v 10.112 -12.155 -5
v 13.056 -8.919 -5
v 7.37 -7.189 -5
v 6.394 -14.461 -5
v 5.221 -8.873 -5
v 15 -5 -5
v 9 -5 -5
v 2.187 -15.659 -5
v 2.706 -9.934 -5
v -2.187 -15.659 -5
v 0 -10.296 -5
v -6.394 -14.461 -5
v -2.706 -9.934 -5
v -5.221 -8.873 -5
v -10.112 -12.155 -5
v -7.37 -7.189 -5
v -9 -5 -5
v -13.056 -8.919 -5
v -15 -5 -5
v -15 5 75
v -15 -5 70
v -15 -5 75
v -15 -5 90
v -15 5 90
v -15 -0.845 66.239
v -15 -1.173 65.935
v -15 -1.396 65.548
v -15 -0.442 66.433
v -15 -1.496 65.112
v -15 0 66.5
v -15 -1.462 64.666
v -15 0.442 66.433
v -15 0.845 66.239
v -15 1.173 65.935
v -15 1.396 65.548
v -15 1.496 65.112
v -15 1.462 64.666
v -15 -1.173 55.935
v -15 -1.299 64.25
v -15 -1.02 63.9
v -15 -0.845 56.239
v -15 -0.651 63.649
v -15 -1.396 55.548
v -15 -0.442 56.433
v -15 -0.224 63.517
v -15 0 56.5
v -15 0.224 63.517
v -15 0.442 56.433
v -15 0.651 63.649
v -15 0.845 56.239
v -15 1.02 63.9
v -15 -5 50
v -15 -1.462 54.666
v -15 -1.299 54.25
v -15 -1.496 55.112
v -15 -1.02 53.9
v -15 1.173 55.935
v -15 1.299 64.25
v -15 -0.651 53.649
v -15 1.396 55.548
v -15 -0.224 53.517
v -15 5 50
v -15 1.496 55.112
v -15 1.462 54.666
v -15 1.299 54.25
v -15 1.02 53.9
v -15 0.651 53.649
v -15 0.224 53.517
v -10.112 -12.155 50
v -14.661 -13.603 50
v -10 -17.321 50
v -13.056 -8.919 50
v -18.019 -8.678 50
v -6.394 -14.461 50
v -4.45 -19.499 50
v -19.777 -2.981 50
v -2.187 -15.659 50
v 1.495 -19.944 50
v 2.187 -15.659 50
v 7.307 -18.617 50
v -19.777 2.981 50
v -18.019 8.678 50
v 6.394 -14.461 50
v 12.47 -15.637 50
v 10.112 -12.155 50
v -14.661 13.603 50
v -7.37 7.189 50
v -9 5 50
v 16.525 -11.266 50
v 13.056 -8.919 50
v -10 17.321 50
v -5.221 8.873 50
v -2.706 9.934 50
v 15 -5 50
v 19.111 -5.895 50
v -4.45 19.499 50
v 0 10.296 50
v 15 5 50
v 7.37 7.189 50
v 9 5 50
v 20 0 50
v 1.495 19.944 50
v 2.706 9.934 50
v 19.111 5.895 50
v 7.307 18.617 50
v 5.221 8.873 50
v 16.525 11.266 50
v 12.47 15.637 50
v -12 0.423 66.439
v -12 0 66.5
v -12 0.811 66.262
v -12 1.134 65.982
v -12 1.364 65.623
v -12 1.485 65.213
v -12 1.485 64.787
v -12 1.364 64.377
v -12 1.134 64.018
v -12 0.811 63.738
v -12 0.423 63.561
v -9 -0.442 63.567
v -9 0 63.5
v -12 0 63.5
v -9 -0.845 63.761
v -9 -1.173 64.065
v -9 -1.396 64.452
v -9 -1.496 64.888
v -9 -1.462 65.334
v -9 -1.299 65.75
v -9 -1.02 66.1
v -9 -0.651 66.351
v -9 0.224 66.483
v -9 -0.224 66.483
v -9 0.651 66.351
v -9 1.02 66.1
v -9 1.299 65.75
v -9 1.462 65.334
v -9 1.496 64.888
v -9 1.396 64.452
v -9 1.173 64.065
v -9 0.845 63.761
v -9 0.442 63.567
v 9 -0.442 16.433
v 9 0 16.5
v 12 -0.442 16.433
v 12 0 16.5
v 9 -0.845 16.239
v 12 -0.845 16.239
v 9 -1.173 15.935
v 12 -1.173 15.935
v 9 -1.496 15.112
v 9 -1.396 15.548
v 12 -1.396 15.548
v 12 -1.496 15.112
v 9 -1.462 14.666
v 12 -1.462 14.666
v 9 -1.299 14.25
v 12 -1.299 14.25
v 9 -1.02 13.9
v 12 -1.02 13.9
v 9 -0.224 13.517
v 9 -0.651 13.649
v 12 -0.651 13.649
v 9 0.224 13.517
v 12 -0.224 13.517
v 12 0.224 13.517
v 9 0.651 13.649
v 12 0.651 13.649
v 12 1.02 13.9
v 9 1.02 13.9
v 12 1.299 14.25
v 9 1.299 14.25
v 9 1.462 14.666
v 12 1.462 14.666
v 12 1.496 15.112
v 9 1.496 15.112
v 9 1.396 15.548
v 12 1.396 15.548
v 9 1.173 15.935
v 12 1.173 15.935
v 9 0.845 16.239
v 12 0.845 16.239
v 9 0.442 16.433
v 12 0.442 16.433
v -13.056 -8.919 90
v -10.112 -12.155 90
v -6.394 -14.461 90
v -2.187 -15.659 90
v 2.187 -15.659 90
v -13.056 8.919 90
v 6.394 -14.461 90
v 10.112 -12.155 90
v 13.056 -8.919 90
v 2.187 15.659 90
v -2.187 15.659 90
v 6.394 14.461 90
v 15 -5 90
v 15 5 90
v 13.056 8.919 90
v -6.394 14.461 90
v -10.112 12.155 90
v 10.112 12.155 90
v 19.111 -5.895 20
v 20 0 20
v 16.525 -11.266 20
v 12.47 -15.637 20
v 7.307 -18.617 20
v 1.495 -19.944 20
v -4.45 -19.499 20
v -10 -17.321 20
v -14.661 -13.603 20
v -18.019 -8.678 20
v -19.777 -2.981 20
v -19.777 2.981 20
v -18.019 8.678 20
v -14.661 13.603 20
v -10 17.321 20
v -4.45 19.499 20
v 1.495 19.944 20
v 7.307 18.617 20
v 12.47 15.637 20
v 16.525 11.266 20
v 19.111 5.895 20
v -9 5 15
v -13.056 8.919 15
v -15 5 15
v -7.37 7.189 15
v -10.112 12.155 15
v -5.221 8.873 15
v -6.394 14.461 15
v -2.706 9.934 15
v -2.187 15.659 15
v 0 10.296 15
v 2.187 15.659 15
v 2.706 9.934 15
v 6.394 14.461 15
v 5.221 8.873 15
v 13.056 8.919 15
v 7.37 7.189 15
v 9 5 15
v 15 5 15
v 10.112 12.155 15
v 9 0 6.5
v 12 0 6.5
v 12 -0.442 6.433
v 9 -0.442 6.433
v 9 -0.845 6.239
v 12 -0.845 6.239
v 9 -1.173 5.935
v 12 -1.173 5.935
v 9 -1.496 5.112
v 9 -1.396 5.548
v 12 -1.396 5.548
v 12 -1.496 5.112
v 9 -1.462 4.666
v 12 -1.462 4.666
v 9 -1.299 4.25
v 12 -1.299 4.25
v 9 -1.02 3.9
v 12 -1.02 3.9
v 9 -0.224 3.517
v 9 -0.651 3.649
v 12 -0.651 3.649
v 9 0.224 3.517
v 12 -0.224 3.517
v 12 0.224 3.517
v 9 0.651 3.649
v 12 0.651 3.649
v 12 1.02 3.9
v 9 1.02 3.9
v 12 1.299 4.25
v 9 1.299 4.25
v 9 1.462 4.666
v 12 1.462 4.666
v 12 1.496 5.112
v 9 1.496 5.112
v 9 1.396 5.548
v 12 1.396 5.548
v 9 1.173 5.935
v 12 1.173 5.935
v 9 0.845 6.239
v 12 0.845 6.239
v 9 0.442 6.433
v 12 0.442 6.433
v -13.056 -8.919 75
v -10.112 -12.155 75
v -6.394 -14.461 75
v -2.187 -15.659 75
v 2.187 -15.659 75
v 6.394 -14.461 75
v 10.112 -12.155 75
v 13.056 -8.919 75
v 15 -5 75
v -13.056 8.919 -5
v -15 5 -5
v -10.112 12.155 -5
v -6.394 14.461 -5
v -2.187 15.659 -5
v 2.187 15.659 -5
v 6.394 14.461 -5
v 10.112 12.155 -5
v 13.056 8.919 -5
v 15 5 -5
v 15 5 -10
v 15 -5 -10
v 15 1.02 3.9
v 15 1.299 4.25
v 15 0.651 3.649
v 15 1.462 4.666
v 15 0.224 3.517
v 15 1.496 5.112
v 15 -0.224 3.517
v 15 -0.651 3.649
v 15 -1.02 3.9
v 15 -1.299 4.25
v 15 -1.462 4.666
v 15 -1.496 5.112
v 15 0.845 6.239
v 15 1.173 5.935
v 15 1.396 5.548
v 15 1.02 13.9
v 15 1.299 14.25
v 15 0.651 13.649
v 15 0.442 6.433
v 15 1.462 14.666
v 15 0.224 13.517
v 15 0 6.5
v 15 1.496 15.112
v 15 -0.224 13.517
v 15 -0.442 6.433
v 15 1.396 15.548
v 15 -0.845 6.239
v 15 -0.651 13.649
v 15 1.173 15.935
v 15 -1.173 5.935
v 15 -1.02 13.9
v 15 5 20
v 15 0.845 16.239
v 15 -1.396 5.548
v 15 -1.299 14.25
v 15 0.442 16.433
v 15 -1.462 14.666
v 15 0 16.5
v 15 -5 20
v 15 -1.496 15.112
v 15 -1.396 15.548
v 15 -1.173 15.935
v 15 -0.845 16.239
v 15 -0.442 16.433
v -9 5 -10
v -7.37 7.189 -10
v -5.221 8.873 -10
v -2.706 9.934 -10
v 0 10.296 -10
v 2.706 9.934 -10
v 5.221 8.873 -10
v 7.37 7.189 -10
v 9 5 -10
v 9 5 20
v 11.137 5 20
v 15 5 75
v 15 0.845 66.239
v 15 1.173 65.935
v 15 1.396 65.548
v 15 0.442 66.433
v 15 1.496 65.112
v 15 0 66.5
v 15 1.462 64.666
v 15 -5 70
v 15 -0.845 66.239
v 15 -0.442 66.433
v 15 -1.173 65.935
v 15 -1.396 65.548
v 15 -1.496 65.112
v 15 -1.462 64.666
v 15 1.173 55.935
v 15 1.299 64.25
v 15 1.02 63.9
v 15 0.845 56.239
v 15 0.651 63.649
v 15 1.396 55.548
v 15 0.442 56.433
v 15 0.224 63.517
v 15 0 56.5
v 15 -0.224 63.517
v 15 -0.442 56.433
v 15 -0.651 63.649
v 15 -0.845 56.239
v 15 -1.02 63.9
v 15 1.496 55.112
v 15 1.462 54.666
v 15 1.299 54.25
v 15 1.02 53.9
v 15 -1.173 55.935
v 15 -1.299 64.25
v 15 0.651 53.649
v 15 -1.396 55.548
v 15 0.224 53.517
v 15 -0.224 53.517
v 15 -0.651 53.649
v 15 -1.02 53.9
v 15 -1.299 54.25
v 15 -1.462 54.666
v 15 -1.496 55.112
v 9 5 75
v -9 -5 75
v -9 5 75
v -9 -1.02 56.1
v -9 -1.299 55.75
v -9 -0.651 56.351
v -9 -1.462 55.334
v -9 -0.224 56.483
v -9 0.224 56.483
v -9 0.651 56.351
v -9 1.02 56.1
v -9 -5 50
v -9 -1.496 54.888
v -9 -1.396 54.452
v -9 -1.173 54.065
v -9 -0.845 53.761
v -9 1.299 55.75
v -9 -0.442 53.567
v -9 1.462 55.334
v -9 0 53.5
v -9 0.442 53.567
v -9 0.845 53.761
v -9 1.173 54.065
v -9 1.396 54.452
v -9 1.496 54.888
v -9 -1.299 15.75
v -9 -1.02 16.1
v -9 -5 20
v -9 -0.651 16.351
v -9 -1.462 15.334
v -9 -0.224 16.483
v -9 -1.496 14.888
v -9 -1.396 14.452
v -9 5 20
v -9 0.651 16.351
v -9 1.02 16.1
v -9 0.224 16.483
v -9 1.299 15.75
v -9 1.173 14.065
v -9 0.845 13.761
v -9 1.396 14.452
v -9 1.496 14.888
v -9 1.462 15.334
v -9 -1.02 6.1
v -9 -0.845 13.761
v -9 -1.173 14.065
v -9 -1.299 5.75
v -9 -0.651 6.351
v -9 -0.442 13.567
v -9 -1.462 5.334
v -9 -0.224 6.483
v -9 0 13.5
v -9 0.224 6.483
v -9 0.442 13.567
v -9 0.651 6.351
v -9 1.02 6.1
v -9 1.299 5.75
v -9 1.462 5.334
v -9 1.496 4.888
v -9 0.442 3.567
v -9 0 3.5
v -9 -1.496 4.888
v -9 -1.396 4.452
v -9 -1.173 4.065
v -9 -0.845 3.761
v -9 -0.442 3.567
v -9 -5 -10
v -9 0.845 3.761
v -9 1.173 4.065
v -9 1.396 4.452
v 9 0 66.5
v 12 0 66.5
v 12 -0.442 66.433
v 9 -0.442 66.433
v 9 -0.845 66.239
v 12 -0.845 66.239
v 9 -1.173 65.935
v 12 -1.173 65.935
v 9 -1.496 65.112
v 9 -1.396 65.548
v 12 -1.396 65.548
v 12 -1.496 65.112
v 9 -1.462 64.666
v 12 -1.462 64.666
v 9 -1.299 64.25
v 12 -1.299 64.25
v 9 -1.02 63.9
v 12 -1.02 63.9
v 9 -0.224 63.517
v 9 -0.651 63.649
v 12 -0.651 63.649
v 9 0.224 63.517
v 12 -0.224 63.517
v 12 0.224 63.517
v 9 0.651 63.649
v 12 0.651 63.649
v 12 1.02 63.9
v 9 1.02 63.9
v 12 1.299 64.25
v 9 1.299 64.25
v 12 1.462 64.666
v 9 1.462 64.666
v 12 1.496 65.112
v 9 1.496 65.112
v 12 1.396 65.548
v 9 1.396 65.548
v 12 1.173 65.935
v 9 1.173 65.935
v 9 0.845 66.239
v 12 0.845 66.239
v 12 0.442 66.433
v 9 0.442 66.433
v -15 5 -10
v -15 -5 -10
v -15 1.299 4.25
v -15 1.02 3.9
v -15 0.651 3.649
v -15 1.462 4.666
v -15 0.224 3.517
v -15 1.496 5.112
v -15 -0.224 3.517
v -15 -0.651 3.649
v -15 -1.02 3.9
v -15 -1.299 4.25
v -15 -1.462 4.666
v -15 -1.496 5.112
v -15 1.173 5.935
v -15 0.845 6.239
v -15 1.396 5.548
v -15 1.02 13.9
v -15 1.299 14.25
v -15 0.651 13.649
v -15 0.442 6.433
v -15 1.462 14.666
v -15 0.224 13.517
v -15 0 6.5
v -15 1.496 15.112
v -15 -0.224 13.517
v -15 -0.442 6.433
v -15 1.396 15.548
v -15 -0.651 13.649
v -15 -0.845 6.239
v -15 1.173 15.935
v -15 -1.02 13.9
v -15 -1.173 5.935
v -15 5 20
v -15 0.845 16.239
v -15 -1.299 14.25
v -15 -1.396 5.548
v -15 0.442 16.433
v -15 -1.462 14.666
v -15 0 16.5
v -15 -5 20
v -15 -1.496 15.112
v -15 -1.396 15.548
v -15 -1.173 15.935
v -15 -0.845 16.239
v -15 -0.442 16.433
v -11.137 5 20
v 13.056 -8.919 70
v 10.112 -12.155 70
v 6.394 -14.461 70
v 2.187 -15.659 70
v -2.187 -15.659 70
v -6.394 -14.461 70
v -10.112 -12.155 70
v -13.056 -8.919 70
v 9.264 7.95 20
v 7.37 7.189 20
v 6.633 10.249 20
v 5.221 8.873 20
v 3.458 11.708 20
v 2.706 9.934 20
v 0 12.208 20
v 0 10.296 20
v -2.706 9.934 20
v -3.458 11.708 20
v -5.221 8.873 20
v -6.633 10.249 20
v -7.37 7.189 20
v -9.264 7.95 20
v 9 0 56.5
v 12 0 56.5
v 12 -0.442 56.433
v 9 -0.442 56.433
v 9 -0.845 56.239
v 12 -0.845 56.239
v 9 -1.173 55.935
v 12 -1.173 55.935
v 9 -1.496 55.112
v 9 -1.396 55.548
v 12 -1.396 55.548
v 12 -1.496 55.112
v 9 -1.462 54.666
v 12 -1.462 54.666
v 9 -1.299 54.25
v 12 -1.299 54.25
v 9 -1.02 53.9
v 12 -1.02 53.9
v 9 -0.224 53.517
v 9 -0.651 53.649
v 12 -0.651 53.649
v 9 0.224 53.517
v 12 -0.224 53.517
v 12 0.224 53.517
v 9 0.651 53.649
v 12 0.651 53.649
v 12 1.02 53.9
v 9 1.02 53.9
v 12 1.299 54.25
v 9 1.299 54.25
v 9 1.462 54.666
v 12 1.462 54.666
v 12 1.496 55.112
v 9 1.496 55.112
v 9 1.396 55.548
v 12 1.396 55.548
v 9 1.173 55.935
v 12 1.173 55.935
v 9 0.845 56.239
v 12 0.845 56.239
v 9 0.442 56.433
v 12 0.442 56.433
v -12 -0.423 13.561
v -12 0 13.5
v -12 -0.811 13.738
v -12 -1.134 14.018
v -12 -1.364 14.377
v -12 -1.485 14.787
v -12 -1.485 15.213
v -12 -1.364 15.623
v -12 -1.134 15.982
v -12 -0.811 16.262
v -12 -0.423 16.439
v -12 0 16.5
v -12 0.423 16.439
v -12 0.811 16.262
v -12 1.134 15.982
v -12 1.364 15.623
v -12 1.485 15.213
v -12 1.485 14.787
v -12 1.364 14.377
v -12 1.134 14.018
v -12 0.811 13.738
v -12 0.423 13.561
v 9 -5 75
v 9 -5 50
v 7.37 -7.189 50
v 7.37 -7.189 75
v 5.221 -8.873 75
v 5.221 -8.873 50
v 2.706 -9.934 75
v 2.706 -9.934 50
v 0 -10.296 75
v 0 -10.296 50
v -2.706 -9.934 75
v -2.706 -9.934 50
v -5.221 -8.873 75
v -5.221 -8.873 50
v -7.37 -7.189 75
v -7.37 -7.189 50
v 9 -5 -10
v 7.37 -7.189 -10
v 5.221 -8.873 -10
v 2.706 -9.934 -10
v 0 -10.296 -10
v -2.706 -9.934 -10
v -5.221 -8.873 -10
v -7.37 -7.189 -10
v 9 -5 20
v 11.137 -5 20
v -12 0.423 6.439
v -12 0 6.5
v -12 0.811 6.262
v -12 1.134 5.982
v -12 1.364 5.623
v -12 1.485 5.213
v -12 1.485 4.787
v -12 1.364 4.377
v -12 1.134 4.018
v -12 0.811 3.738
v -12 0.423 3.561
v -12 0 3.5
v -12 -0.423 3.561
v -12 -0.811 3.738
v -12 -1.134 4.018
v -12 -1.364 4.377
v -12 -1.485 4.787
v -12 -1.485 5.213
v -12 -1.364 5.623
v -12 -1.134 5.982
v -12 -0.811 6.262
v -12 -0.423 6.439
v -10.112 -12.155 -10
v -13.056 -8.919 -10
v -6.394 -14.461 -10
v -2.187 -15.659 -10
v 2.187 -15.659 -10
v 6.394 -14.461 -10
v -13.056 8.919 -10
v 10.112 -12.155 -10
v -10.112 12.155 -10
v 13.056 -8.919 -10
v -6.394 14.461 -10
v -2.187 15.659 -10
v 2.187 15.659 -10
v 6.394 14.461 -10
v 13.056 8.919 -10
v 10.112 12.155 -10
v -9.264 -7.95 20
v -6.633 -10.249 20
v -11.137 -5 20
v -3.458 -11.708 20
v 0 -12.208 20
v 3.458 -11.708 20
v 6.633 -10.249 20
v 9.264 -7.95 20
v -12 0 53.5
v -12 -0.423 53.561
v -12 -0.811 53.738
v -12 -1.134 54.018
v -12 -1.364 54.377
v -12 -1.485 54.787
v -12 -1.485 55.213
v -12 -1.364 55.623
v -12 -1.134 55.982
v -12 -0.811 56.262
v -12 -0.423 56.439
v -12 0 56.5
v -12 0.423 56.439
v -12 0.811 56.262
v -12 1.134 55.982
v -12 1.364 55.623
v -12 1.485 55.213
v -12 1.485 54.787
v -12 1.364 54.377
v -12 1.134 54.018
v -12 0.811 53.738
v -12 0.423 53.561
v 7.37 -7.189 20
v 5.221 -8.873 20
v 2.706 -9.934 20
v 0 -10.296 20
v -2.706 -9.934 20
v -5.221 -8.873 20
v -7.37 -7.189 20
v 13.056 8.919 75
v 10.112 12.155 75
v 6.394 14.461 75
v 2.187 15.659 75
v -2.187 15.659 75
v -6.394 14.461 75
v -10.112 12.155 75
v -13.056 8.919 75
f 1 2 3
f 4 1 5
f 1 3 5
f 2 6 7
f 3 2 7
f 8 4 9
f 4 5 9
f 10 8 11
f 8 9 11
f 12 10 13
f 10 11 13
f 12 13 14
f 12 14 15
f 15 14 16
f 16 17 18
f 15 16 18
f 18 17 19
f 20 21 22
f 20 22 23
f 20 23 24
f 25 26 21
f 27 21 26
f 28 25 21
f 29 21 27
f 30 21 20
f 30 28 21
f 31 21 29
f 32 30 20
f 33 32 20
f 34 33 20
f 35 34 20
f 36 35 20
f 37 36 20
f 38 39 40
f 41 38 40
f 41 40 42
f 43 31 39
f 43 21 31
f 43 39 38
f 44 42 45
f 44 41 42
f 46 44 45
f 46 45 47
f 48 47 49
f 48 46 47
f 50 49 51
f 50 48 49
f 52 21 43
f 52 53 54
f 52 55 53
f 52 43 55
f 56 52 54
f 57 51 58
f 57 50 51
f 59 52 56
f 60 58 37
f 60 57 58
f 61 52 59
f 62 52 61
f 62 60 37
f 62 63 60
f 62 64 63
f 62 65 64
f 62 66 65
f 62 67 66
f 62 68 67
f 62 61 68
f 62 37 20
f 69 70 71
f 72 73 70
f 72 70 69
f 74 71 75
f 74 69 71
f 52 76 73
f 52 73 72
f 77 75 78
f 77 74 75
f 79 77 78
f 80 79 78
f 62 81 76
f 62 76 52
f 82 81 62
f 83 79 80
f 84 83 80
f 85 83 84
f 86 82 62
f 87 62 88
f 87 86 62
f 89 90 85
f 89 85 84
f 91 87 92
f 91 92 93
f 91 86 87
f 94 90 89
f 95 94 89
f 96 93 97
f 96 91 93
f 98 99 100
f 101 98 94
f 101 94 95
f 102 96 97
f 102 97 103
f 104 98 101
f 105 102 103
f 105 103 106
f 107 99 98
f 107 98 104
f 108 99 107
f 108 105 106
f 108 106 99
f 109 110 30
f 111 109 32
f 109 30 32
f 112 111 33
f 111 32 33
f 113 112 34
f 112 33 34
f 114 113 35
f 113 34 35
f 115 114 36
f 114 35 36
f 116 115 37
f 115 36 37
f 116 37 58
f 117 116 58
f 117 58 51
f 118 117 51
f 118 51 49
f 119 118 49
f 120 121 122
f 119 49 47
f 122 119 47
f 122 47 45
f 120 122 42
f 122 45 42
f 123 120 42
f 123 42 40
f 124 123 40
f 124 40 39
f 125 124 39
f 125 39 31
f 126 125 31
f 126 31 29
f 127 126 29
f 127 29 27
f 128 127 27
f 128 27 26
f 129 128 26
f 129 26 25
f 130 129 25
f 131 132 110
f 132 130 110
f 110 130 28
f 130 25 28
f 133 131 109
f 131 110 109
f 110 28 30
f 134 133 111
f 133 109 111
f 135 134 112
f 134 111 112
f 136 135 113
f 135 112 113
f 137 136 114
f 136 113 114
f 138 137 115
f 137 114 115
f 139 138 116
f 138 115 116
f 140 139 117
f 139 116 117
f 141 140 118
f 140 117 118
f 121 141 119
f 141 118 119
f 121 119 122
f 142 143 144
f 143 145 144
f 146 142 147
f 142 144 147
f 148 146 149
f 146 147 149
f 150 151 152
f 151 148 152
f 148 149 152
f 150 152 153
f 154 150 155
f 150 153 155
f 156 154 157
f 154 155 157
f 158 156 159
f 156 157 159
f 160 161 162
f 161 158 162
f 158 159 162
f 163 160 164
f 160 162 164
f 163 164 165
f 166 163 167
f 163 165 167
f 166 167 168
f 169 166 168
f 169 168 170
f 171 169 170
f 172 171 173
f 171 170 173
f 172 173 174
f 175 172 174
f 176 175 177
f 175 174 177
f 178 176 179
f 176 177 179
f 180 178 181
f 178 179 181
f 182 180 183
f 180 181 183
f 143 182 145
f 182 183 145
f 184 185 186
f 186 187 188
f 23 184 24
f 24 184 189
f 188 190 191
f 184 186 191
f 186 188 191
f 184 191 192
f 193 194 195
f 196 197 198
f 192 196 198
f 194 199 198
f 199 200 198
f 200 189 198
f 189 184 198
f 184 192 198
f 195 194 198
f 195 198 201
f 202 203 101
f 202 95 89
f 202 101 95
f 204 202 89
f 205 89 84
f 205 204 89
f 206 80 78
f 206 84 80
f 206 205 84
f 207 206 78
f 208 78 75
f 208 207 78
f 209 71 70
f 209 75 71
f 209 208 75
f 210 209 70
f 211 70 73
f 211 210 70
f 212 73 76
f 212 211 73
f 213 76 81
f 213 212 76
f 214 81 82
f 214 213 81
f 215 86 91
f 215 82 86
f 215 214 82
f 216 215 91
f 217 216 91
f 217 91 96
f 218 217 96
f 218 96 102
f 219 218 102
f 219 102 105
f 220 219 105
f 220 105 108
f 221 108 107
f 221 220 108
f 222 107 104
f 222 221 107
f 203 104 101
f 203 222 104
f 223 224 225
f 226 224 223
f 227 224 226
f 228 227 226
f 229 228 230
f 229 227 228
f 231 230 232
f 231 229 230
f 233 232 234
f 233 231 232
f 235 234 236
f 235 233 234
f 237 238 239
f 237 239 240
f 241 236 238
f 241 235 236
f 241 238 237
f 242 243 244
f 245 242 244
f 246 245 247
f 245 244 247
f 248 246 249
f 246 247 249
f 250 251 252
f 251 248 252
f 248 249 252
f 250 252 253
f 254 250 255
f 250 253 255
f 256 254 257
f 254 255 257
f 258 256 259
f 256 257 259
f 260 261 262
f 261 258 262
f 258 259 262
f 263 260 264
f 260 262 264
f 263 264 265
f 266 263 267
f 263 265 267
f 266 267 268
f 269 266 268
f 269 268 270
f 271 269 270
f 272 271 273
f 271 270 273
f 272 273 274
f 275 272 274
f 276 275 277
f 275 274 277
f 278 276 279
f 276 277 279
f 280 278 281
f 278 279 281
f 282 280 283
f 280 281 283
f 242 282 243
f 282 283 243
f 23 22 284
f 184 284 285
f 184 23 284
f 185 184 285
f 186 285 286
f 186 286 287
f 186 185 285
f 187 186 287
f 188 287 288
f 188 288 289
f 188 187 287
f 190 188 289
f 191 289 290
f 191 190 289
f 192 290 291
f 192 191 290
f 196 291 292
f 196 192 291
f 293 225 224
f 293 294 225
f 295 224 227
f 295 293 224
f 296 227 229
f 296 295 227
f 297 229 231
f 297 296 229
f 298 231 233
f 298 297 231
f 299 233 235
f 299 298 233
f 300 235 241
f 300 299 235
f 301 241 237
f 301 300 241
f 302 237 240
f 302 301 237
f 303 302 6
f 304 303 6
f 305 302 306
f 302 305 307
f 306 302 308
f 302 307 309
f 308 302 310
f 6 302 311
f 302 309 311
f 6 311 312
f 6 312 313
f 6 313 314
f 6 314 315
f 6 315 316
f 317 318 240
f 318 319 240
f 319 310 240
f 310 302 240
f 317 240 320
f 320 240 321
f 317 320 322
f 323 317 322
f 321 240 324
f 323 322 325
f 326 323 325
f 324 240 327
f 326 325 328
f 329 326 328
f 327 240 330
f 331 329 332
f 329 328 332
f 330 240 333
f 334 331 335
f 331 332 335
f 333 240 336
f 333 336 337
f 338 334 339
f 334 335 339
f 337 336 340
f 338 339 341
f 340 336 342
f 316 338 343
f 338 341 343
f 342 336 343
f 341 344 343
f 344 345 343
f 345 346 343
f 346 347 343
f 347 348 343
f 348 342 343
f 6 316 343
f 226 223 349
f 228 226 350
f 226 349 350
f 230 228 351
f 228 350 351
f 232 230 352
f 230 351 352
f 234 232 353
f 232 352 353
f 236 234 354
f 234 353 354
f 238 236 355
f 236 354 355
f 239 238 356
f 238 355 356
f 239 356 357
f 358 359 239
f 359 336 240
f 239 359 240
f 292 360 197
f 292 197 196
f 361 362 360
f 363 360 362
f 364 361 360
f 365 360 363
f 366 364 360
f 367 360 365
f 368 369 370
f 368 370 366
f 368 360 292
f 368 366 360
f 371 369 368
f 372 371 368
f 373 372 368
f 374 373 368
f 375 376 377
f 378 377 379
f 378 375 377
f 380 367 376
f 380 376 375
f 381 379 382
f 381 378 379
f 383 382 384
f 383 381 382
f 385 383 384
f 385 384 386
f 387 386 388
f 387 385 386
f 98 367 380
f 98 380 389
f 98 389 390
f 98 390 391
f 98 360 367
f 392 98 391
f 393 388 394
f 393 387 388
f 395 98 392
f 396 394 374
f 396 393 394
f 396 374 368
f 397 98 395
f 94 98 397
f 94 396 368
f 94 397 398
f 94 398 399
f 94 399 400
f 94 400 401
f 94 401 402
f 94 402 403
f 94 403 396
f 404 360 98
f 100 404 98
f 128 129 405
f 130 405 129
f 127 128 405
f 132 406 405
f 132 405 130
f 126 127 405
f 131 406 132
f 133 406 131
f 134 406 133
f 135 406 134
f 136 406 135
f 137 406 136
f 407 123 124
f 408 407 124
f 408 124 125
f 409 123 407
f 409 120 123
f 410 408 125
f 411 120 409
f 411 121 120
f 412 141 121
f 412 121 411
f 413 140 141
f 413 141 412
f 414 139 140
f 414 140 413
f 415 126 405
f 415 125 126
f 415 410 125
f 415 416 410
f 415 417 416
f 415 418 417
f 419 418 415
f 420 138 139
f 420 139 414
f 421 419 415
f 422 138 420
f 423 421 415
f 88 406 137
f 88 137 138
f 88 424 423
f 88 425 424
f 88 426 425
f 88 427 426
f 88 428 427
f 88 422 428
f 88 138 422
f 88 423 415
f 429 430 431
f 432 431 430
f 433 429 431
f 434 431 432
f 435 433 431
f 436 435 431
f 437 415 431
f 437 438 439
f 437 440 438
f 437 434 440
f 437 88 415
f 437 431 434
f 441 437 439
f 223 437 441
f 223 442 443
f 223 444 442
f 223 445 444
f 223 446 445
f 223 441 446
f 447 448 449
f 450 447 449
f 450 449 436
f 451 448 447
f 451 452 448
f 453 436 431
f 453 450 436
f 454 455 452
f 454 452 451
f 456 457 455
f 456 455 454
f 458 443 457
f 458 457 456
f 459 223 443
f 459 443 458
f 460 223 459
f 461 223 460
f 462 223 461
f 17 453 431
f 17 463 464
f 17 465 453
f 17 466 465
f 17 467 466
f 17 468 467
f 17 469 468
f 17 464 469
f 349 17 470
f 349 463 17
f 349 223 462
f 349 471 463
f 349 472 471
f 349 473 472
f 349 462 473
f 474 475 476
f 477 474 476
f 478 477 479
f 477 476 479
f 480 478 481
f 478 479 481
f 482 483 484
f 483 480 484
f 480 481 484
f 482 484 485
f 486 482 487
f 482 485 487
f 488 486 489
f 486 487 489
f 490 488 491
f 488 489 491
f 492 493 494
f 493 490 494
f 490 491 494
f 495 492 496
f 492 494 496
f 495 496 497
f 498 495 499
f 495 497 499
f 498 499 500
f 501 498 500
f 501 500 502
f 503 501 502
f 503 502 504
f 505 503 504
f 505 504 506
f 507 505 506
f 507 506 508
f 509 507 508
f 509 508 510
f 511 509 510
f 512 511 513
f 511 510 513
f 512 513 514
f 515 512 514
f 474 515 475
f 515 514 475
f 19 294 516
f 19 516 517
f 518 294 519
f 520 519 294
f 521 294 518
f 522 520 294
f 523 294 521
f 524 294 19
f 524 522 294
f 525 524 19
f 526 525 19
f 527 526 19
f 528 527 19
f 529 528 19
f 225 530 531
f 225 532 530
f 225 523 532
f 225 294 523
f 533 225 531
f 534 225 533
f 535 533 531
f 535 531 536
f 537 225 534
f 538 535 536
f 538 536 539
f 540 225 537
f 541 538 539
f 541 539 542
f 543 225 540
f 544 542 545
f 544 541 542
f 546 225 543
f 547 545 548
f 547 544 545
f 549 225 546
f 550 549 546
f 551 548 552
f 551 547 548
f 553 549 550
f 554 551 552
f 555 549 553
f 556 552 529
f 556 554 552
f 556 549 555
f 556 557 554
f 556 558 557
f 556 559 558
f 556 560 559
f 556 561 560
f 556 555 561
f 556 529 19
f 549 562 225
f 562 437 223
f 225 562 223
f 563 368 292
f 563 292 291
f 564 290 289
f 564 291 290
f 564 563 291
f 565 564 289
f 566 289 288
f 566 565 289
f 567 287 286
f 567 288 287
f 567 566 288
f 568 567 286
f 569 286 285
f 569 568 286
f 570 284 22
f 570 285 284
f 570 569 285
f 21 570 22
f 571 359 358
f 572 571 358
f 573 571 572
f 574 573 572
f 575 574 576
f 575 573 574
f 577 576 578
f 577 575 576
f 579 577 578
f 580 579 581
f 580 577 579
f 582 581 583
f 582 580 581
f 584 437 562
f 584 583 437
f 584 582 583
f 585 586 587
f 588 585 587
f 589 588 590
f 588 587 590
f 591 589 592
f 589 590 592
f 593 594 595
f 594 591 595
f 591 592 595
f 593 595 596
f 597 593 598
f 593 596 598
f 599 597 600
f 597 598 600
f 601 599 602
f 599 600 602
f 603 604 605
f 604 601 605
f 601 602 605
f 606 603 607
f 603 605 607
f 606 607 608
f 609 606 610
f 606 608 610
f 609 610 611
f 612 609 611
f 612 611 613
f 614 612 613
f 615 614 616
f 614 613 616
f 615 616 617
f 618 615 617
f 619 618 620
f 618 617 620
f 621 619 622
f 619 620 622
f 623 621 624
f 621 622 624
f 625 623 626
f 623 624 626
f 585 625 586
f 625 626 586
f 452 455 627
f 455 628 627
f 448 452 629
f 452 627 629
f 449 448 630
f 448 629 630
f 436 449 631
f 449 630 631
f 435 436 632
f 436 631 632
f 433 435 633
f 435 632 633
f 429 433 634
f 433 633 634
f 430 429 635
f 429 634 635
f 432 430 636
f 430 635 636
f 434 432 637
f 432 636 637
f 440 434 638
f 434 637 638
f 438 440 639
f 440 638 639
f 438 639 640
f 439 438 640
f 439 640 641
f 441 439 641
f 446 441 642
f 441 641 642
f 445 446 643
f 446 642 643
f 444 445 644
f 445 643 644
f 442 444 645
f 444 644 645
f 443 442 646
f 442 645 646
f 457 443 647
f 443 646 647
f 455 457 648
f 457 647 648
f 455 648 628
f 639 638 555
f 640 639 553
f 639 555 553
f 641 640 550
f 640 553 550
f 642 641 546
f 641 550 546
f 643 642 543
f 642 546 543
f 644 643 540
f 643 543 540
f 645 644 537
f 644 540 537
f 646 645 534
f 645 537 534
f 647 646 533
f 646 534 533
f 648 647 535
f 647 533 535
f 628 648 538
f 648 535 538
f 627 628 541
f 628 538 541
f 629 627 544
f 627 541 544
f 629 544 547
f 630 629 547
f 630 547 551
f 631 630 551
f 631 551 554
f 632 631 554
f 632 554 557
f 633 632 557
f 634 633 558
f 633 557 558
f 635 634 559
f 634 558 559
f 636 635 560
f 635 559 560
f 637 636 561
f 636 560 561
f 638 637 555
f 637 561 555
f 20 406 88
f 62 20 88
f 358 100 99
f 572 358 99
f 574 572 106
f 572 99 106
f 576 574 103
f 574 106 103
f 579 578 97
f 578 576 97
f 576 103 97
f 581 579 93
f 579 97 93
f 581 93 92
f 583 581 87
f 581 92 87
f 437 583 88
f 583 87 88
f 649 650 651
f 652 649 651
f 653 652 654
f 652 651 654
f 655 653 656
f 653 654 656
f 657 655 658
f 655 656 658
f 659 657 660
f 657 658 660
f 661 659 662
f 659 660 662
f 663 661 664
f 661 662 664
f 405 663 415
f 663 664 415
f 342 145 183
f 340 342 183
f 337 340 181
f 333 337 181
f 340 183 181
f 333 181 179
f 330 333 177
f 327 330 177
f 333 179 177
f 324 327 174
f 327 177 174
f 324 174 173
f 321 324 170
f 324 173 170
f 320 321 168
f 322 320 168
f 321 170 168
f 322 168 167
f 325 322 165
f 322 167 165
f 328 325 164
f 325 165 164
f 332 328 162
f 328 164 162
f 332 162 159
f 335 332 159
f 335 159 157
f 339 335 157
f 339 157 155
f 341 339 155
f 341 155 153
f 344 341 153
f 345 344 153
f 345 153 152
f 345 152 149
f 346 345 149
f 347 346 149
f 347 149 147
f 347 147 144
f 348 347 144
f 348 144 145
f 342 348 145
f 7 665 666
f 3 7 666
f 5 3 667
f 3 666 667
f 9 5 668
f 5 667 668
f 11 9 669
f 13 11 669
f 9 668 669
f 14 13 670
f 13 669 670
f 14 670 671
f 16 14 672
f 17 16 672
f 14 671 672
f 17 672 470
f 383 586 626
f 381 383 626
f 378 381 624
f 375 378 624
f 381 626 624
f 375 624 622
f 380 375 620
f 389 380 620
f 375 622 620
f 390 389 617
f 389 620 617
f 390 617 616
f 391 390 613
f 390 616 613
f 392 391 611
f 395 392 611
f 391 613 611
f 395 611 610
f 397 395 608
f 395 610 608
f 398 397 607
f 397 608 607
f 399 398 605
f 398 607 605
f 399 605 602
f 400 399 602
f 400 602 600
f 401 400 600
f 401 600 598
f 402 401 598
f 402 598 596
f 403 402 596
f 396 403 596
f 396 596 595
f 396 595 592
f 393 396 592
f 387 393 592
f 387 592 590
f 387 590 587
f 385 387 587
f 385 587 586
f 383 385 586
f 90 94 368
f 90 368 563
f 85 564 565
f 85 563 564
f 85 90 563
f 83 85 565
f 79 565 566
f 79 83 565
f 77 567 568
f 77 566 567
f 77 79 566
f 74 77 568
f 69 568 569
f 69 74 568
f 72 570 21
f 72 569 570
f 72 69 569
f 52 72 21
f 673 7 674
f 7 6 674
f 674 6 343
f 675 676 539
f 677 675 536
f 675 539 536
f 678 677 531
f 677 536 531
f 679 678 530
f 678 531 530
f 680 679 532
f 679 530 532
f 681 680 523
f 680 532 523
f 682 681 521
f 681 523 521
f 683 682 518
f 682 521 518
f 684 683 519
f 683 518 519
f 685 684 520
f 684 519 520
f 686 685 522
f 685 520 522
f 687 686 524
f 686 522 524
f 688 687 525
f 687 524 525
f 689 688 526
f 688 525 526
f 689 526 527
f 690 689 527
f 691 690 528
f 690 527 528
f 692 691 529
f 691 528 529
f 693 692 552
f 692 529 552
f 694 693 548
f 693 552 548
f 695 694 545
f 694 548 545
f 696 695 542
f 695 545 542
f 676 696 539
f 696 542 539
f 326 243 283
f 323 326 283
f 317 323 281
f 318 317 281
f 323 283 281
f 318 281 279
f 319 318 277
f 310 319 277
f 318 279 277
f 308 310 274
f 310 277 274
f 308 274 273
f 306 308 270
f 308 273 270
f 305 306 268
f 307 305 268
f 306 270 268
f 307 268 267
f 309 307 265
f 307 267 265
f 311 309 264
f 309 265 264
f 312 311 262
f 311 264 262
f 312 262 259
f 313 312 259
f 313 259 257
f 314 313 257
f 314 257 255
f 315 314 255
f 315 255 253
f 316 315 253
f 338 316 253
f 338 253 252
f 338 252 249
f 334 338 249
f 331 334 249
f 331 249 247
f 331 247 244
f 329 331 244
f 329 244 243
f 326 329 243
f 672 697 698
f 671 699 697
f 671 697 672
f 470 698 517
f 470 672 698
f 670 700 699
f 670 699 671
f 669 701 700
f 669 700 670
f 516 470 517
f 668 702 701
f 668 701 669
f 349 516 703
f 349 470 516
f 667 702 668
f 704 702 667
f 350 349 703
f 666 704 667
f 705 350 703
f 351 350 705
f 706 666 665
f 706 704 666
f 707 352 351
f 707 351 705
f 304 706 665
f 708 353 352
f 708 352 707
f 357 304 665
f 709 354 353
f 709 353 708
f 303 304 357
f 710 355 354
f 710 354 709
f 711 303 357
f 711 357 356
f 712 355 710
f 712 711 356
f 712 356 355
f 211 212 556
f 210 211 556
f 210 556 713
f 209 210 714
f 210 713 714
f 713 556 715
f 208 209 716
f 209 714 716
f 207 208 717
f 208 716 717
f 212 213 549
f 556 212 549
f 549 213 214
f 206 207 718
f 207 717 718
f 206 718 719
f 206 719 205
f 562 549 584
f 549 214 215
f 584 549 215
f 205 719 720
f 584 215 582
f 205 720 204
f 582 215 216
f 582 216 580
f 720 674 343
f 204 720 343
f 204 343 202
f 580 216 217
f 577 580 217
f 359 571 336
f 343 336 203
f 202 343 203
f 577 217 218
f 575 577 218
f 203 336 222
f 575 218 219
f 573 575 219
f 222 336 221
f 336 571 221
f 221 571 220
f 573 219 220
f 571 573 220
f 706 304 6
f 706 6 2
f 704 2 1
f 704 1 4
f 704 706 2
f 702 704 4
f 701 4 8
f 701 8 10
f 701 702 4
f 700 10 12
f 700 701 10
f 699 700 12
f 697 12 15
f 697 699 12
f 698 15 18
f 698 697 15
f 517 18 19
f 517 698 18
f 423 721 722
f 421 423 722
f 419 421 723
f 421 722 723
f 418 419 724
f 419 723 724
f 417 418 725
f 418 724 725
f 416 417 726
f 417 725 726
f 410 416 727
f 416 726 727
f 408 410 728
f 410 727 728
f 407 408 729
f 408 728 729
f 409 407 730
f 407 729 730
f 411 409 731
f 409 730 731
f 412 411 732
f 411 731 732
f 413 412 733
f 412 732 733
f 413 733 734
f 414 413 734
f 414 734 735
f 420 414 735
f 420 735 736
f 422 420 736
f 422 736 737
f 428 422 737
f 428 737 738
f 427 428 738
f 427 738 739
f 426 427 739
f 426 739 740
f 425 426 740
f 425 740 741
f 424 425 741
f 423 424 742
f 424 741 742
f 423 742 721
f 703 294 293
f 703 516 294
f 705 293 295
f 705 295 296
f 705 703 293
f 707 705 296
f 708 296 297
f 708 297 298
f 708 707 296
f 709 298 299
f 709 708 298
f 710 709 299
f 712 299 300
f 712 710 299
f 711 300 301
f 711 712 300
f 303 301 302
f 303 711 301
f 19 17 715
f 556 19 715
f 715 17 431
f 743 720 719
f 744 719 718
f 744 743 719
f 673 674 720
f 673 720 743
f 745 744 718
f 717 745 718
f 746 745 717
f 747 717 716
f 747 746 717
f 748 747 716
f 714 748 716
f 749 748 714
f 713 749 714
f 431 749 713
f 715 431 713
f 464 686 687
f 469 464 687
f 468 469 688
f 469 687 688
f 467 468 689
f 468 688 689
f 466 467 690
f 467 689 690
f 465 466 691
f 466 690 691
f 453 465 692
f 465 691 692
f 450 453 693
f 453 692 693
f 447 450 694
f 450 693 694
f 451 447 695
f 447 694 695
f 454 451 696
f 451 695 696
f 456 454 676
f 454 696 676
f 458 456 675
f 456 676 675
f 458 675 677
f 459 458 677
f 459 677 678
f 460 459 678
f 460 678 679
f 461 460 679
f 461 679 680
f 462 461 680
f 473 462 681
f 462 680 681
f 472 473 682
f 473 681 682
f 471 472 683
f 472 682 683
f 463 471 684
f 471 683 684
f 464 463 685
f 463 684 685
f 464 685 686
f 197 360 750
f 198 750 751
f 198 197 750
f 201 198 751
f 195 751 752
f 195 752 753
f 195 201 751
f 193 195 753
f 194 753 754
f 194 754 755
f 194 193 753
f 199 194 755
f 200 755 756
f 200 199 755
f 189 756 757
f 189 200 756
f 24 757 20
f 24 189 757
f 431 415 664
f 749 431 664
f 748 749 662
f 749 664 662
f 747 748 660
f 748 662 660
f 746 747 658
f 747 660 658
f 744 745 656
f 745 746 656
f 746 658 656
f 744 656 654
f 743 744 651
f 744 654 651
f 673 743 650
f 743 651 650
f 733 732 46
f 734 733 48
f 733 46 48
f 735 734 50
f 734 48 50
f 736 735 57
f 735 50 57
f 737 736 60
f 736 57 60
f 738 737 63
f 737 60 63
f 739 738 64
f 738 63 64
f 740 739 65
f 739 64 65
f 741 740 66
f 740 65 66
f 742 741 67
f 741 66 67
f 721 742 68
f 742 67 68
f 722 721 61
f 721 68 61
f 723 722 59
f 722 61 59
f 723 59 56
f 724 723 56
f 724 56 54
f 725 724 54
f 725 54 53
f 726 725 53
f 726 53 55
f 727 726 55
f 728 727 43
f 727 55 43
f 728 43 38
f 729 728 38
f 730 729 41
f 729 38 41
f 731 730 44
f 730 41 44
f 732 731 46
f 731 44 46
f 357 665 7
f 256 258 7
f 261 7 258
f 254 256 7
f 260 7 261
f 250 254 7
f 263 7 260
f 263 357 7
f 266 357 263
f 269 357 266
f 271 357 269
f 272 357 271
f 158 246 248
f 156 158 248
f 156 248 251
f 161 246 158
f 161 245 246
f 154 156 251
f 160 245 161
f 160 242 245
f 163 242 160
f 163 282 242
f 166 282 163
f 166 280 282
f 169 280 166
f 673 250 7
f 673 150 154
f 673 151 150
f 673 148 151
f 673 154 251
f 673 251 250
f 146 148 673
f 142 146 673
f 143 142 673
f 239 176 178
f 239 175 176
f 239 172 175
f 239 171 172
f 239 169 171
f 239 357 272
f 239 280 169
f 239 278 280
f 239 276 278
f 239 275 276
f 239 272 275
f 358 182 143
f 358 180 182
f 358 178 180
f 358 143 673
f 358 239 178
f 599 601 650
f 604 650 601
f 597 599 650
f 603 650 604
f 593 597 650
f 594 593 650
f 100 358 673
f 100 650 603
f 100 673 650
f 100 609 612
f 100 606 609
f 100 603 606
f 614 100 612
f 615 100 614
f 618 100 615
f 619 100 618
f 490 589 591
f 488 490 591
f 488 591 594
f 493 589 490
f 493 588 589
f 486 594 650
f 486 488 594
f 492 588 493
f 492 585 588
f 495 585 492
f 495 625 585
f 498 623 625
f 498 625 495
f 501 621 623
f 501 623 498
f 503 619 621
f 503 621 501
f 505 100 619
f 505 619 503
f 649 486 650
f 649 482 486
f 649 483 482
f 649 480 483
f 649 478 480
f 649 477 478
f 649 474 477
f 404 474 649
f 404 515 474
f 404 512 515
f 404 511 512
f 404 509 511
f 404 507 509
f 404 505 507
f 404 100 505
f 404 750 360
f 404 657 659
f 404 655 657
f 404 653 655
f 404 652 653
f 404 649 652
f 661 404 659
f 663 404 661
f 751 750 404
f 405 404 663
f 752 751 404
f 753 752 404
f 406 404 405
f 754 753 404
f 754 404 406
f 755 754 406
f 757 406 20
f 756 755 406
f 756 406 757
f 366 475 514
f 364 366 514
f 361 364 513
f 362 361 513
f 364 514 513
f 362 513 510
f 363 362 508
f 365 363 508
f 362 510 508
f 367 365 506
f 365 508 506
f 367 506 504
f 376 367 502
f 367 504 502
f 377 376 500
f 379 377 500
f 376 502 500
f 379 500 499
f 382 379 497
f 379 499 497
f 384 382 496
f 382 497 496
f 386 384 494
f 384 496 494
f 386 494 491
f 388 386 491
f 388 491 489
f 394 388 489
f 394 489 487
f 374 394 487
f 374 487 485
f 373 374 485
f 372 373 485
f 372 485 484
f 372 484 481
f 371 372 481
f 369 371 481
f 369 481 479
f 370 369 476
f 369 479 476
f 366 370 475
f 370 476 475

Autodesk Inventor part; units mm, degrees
ref_plane "YZ Plane" through (0, 0, 0) normal (1, 0, 0) x (0, 1, 0)
ref_plane "XZ Plane" through (0, 0, 0) normal (0, 1, 0) x (-1, 0, 0)
ref_plane "XY Plane" through (0, 0, 0) normal (0, 0, 1) x (1, 0, 0)
ref_plane "Work Plane2" through (0, 0, 20) normal (0, 0, 1) x (1, 0, 0)
sketch "Sketch3" plane through (0, 0, 20) normal (0, 0, 1) x (1, 0, 0)
  line L0 (-11.1369, 5) -> (-11.1369, -5)
  line L1 (-11.1369, 5) -> (-14.9999, 5)
  line L2 (-14.9999, 5) -> (-14.9999, -5)
  line L3 (-14.9999, -5) -> (-11.1369, -5)
  line L4 (-11.1369, -5) -> (-11.1369, 5)
  line L5 (11.1369, 5) -> (14.9999, 5)
  line L6 (14.9999, 5) -> (14.9999, -5)
  line L7 (14.9999, -5) -> (11.1369, -5)
  line L8 (11.1369, -5) -> (11.1369, 5)
  point P0 (0, 0)
  point P1 (0, 0)
  dimension "d9" = 3.863
  dimension "d10" = 3.863
extrude "Extrusion3" add sketch "Sketch3" against normal blind 30
sketch "Sketch4" plane through (-14.9999, -5, 20) normal (-1, 0, 0) x (0, 0, 1)
  line L0 (0, 5) -> (0, 0)
  circle A0 centre (-15, 5) radius 1.5
  circle A1 centre (-5, 5) radius 1.5
  point P0 (-20, 5)
  dimension "d13" = 5
  dimension "d14" = 5
  dimension "d17" = 3
  dimension "d18" = 3
extrude "Extrusion4" cut sketch "Sketch4" against normal blind 200
sketch "Sketch5" plane through (0, 0, 20) normal (0, 0, 1) x (1, 0, 0)
  circle A0 centre (0, 0) radius 20
  circle A1 centre (0, 0) radius 12.2078
  point P0 (-14.9999, 5)
  point P1 (-11.1369, -5)
  point P2 (11.1369, -5)
  point P3 (14.9999, 5)
  dimension "d21" = 40
extrude "Extrusion5" add sketch "Sketch5" along normal blind 30
sketch "Sketch6" plane through (0, 0, 20) normal (0, 0, 1) x (1, 0, 0)
  line L0 (-14.9999, -5) -> (-11.1369, -5) projected
  line L1 (-14.9999, 5) -> (-11.1369, 5) projected
  line L2 (-11.1369, -5) -> (-13.4979, -5)
  line L3 (-13.4979, -5) -> (-13.4979, 5)
  line L4 (-13.4979, 5) -> (-11.1369, 5)
  line L5 (-11.1369, 5) -> (-11.1369, -5)
  line L6 (11.1369, -5) -> (11.1369, 5) projected
  line L7 (11.1369, -5) -> (13.9529, -5)
  line L8 (13.9529, -5) -> (13.9529, 5)
  line L9 (13.9529, 5) -> (11.1369, 5)
  line L10 (11.1369, 5) -> (11.1369, -5)
  arc A0 (11.1369, 5) -> (-11.1369, 5) centre (0, 0) ccw projected
  arc A1 (-11.1369, -5) -> (11.1369, -5) centre (0, 0) ccw projected
  arc A2 (-11.1369, 5) -> (-11.1369, -5) centre (0, 0) ccw
  line L11 (14.9999, -5) -> (11.1369, -5) projected
  line L12 (11.1369, 5) -> (14.9999, 5) projected
  arc A3 (11.1369, -5) -> (11.1369, 5) centre (0, 0) ccw
extrude "Extrusion6" add sketch "Sketch6" along normal blind 30 contours A2 L5 | L6 A3
sketch "Sketch7" plane through (0, 0, 50) normal (0, 0, 1) x (1, 0, 0)
  line L0 (-14.9999, -5) -> (-11.1369, -5) projected
  line L1 (-14.9999, 5) -> (-11.1369, 5) projected
  line L2 (-11.1369, -5) -> (-14.9999, -5)
  line L3 (-14.9999, -5) -> (-14.9999, 5)
  line L4 (-14.9999, 5) -> (-11.1369, 5)
  line L5 (-11.1369, 5) -> (-11.1369, -5)
  arc A0 (-11.1369, -5) -> (11.1369, -5) centre (0, 0) ccw projected
  line L6 (14.9999, 5) -> (14.9999, -5) projected
  line L7 (11.1369, -5) -> (14.9999, -5)
  line L8 (14.9999, -5) -> (14.9999, 5)
  line L9 (14.9999, 5) -> (11.1369, 5)
  line L10 (11.1369, 5) -> (11.1369, -5)
extrude "Extrusion7" add sketch "Sketch7" along normal blind 40
sketch "Sketch8" plane through (-14.9999, -5, 50) normal (-1, 0, 0) x (0, 0, 1)
  circle A0 centre (15, 5) radius 1.5
  circle A1 centre (5, 5) radius 1.5
  point P0 (-50, 5)
  point P1 (40, 0)
  dimension "d31" = 3
  dimension "d32" = 3
extrude "Extrusion8" cut sketch "Sketch8" against normal blind 200
sketch "Sketch10" plane through (0, 0, -10) normal (0, 0, -1) x (-1, 0, 0)
  line L0 (11.1369, -5) -> (11.1369, 5) projected
  line L1 (11.1369, -5) -> (11.9999, -5)
  line L2 (11.9999, -5) -> (11.9999, -3.8424)
  line L3 (11.9999, -3.8424) -> (11.1369, -3.8424)
  line L4 (11.1369, -3.8424) -> (11.1369, -5)
  line L5 (11.9999, -3.8424) -> (11.1369, -3.8424)
  line L6 (11.1369, -3.8424) -> (11.1369, 5)
  line L7 (11.1369, 5) -> (11.9999, 5)
  line L8 (11.9999, 5) -> (11.9999, -3.8424)
  line L9 (-14.9999, -5) -> (-11.1369, -5) projected
  line L10 (-11.1369, 5) -> (-14.9999, 5) projected
  line L11 (-11.1369, -5) -> (-11.9999, -5)
  line L12 (-11.9999, -5) -> (-11.9999, 5)
  line L13 (-11.9999, 5) -> (-11.1369, 5)
  line L14 (-11.1369, 5) -> (-11.1369, -5)
  point P0 (0, 0)
  dimension "d35" = 0.863
  dimension "d36" = 0.863
extrude "Extrusion9" cut sketch "Sketch10" against normal blind 200
sketch "Sketch11" plane through (0, 0, 50) normal (0, 0, 1) x (1, 0, 0)
  line L0 (-11.9999, -5) -> (-11.1369, -5) projected
  line L1 (-11.1369, -5) -> (-11.9999, -5)
  line L2 (-11.9999, -5) -> (-11.9999, 5)
  line L3 (-11.9999, 5) -> (-11.1369, 5)
  line L4 (-11.1369, 5) -> (-11.1369, -5)
  line L5 (11.9999, -5) -> (11.1369, -5) projected
  line L6 (11.9999, 5) -> (14.9999, 5) projected
  line L7 (11.1369, -5) -> (11.9999, -5)
  line L8 (11.9999, -5) -> (11.9999, 5)
  line L9 (11.9999, 5) -> (11.1369, 5)
  line L10 (11.1369, 5) -> (11.1369, -5)
  point P0 (0, 0)
extrude "Extrusion10" add sketch "Sketch11" against normal blind 30
sketch "Sketch12" plane through (11.9999, -5, -10) normal (-1, 0, 0) x (0, 0, 1)
  line L0 (100, 10) -> (100, 0) projected
  line L1 (0, 10) -> (100, 10)
  line L2 (100, 10) -> (100, 0)
  line L3 (100, 0) -> (0, 0)
  line L4 (0, 0) -> (0, 10)
  circle A0 centre (65, 5) radius 1.5 projected
  circle A1 centre (65, 5) radius 1.5
  circle A2 centre (75, 5) radius 1.5 projected
  circle A3 centre (75, 5) radius 1.5
  circle A4 centre (25, 5) radius 1.5 projected
  circle A5 centre (25, 5) radius 1.5
  circle A6 centre (15, 5) radius 1.5 projected
  circle A7 centre (15, 5) radius 1.5
  point P0 (30, 0)
extrude "Extrusion11" add sketch "Sketch12" along normal blind 3
sketch "Sketch13" plane through (-11.9999, -5, -10) normal (1, 0, 0) x (0, 0, -1)
  line L0 (-30, 10) -> (0, 10) projected
  line L1 (-100, 0) -> (-100, 10) projected
  line L2 (0, 10) -> (-100, 10)
  line L3 (-100, 10) -> (-100, 0)
  line L4 (-100, 0) -> (0, 0)
  line L5 (0, 0) -> (0, 10)
  circle A0 centre (-65, 5) radius 1.5 projected
  circle A1 centre (-65, 5) radius 1.5
  circle A2 centre (-75, 5) radius 1.5 projected
  circle A3 centre (-75, 5) radius 1.5
  circle A4 centre (-15, 5) radius 1.5 projected
  circle A5 centre (-15, 5) radius 1.5
  circle A6 centre (-25, 5) radius 1.5 projected
  circle A7 centre (-25, 5) radius 1.5
  point P0 (-10, 5)
extrude "Extrusion12" add sketch "Sketch13" along normal blind 3
sketch "Sketch14" plane through (0, 0, -10) normal (0, 0, -1) x (-1, 0, 0)
  line L0 (14.9999, -5) -> (14.9999, 5) projected
  line L1 (8.9999, -5) -> (8.9999, 5) projected
  line L2 (8.9999, -5) -> (14.9999, -5) projected
  line L3 (14.9999, 5) -> (8.9999, 5) projected
  arc A0 (8.9999, 5) -> (-8.9999, 5) centre (0, 0) ccw
  arc A1 (-8.9999, -5) -> (8.9999, -5) centre (0, 0) ccw
  arc A2 (14.9999, 5) -> (-14.9999, 5) centre (0, 0) ccw
  arc A3 (-14.9999, -5) -> (14.9999, -5) centre (0, 0) ccw
  line L4 (14.9999, 5) -> (8.9999, 5)
  line L5 (-8.9999, 5) -> (-14.9999, 5)
  line L6 (14.9999, -5) -> (8.9999, -5)
  line L7 (-8.9999, -5) -> (-14.9999, -5)
extrude "Extrusion13" add sketch "Sketch14" against normal blind 5
sketch "Sketch19" plane through (0, 0, -5) normal (0, 0, 1) x (1, 0, 0)
  arc A0 (8.9999, 5) -> (-8.9999, 5) centre (0, 0) ccw
  arc A1 (14.9999, 5) -> (-14.9999, 5) centre (0, 0) ccw
  line L0 (14.9999, 5) -> (8.9999, 5)
  line L1 (-8.9999, 5) -> (-14.9999, 5)
  point P0 (8.9999, 5)
extrude "Extrusion17" add sketch "Sketch19" along normal blind 20
sketch "Sketch20" plane through (8.9999, -5, -10) normal (-1, 0, 0) x (0, 0, 1)
  line L0 (100, 10) -> (25, 10) projected
  line L1 (5, 0) -> (100, 0) projected
  line L2 (100, 10) -> (90, 10)
  line L3 (90, 10) -> (90, 0)
  line L4 (90, 0) -> (100, 0)
  line L5 (100, 0) -> (100, 10)
  point P0 (10, 5)
  dimension "d62" = 10
extrude "Extrusion18" add sketch "Sketch20" along normal blind 20
sketch "Sketch21" plane through (11.1369, -5, 20) normal (0, -1, 0) x (1, 0, 0)
  line L0 (-20.1369, -5) -> (-20.1369, 60) projected
  line L1 (-20.1369, 55) -> (-20.1369, 55)
  line L2 (-15.1369, 60) -> (-15.1369, 60)
  line L3 (-2.137, 60) -> (-20.1369, 60) projected
  line L4 (-2.137, 60) -> (-2.137, -5) projected
  line L5 (-7.137, 60) -> (-7.137, 60)
  line L6 (-2.137, 55) -> (-2.137, 55)
  arc A0 (-15.1369, 60) -> (-20.1369, 55) centre (-15.1369, 55) ccw
  arc A1 (-2.137, 55) -> (-7.137, 60) centre (-7.137, 55) ccw
  line L7 (-20.1369, 55) -> (-20.1369, 60)
  line L8 (-15.1369, 60) -> (-20.1369, 60)
  line L9 (-7.137, 60) -> (-2.137, 60)
  line L10 (-2.137, 60) -> (-2.137, 55)
  point P0 (-11.1369, -20)
  dimension "d65" = 5
  dimension "d66" = 5
  dimension "d67" = 5
  dimension "d68" = 5
  dimension "d69" = 5
extrude "Extrusion19" add sketch "Sketch21" against normal blind 10
sketch "Sketch22" plane through (0, 0, 50) normal (0, 0, 1) x (1, 0, 0)
  arc A0 (14.9999, 5) -> (-14.9999, 5) centre (0, 0) ccw projected
  arc A1 (-14.9999, -5) -> (14.9999, -5) centre (0, 0) ccw
  arc A2 (-8.9999, 5) -> (8.9999, 5) centre (0, 0) ccw
  line L0 (14.9999, 5) -> (-14.9999, 5) projected
  line L1 (-14.9999, 5) -> (14.9999, 5)
  line L2 (-11.1369, -5) -> (-14.9999, -5) projected
  arc A3 (-14.9999, -5) -> (14.9999, -5) centre (0, 0) ccw projected
  line L3 (-14.9999, -5) -> (-8.9999, -5)
  line L4 (8.9999, -5) -> (14.9999, -5)
extrude "Extrusion20" add sketch "Sketch22" along normal blind 20 contours L4 A1 L2 L3 A2
sketch "Sketch23" plane through (0, 0, 50) normal (0, 0, -1) x (-1, 0, 0)
  arc A0 (-11.1369, -5) -> (11.1369, -5) centre (0, 0) ccw projected
  circle A1 centre (0, 0) radius 12.2078
  line L0 (8.9999, 5) -> (8.9999, -5) projected
  circle A2 centre (0, 0) radius 10.2956
  line L1 (8.9999, -5) -> (11.1369, -5) projected
  line L2 (-11.1369, 5) -> (-14.9999, 5) projected
  arc A3 (11.1369, 5) -> (-11.1369, 5) centre (0, 0) ccw projected
  line L3 (11.1369, -5) -> (8.9999, -5)
  line L4 (-8.9999, -5) -> (-11.1369, -5)
  line L5 (-11.1369, 5) -> (-8.9999, 5)
  line L6 (8.9999, 5) -> (11.1369, 5)
extrude "Extrusion21" add sketch "Sketch23" along normal blind 30 contours L4 A2 L1 A0 | A1 L6 A2 L5
sketch "Sketch24" plane through (-14.9999, 5, 90) normal (0, 1, 0) x (1, 0, 0)
  point P0 (14.9999, 90)
sketch "Sketch25" plane through (0, 0, 90) normal (0, 0, 1) x (1, 0, 0)
  arc A0 (-14.9999, -5) -> (14.9999, -5) centre (0, 0) ccw projected
  line L0 (-8.9999, 5) -> (-8.9999, -5) projected
  line L1 (14.9999, 5) -> (-14.9999, 5) projected
  line L2 (14.9999, 5) -> (-14.9999, 5)
  line L3 (-14.9999, -5) -> (-8.9999, -5) projected
  line L4 (14.9999, -5) -> (-14.9999, -5)
  arc A1 (-14.9999, -5) -> (14.9999, -5) centre (0, 0) ccw
  arc A2 (14.9999, 5) -> (-14.9999, 5) centre (0, 0) ccw
extrude "Extrusion22" add sketch "Sketch25" against normal blind 15
sketch "Sketch26" plane through (8.9999, 5, 50) normal (0, 1, 0) x (1, 0, 0)
  arc A0 (-5, -30) -> (0, -25) centre (-5, -25) ccw projected
  line L0 (0, -25) -> (-17.9999, -25)
  line L1 (-12.9999, -30) -> (-5, -30)
  arc A1 (-5, -30) -> (0, -25) centre (-5, -25) ccw
  line L2 (-23.9999, -25) -> (-17.9999, -25) projected
  arc A2 (-17.9999, -25) -> (-12.9999, -30) centre (-12.9999, -25) ccw
  line L3 (-5, -30) -> (-12.9999, -30)
  point P0 (-8.9999, 50)
extrude "Extrusion23" add sketch "Sketch26" against normal blind 10
sketch "Sketch28" plane through (0, 0, 70) normal (0, 0, 1) x (1, 0, 0)
  line L0 (-14.8626, -5) -> (-8.9999, -5)
  line L1 (8.9999, -5) -> (14.9999, -5) projected
  line L2 (8.9999, -5) -> (14.9999, -5)
  arc A0 (-14.9999, -5) -> (14.9999, -5) centre (0, 0) ccw
  line L3 (-14.9999, -5) -> (-8.9999, -5) projected
  line L4 (-14.8626, -5) -> (-14.9999, -5)
  arc A1 (-8.9999, -5) -> (8.9999, -5) centre (0, 0) ccw
  point P0 (0, 0)
extrude "Extrusion24" add sketch "Sketch28" along normal blind 5
properties part number "Part2_abbGripp"
